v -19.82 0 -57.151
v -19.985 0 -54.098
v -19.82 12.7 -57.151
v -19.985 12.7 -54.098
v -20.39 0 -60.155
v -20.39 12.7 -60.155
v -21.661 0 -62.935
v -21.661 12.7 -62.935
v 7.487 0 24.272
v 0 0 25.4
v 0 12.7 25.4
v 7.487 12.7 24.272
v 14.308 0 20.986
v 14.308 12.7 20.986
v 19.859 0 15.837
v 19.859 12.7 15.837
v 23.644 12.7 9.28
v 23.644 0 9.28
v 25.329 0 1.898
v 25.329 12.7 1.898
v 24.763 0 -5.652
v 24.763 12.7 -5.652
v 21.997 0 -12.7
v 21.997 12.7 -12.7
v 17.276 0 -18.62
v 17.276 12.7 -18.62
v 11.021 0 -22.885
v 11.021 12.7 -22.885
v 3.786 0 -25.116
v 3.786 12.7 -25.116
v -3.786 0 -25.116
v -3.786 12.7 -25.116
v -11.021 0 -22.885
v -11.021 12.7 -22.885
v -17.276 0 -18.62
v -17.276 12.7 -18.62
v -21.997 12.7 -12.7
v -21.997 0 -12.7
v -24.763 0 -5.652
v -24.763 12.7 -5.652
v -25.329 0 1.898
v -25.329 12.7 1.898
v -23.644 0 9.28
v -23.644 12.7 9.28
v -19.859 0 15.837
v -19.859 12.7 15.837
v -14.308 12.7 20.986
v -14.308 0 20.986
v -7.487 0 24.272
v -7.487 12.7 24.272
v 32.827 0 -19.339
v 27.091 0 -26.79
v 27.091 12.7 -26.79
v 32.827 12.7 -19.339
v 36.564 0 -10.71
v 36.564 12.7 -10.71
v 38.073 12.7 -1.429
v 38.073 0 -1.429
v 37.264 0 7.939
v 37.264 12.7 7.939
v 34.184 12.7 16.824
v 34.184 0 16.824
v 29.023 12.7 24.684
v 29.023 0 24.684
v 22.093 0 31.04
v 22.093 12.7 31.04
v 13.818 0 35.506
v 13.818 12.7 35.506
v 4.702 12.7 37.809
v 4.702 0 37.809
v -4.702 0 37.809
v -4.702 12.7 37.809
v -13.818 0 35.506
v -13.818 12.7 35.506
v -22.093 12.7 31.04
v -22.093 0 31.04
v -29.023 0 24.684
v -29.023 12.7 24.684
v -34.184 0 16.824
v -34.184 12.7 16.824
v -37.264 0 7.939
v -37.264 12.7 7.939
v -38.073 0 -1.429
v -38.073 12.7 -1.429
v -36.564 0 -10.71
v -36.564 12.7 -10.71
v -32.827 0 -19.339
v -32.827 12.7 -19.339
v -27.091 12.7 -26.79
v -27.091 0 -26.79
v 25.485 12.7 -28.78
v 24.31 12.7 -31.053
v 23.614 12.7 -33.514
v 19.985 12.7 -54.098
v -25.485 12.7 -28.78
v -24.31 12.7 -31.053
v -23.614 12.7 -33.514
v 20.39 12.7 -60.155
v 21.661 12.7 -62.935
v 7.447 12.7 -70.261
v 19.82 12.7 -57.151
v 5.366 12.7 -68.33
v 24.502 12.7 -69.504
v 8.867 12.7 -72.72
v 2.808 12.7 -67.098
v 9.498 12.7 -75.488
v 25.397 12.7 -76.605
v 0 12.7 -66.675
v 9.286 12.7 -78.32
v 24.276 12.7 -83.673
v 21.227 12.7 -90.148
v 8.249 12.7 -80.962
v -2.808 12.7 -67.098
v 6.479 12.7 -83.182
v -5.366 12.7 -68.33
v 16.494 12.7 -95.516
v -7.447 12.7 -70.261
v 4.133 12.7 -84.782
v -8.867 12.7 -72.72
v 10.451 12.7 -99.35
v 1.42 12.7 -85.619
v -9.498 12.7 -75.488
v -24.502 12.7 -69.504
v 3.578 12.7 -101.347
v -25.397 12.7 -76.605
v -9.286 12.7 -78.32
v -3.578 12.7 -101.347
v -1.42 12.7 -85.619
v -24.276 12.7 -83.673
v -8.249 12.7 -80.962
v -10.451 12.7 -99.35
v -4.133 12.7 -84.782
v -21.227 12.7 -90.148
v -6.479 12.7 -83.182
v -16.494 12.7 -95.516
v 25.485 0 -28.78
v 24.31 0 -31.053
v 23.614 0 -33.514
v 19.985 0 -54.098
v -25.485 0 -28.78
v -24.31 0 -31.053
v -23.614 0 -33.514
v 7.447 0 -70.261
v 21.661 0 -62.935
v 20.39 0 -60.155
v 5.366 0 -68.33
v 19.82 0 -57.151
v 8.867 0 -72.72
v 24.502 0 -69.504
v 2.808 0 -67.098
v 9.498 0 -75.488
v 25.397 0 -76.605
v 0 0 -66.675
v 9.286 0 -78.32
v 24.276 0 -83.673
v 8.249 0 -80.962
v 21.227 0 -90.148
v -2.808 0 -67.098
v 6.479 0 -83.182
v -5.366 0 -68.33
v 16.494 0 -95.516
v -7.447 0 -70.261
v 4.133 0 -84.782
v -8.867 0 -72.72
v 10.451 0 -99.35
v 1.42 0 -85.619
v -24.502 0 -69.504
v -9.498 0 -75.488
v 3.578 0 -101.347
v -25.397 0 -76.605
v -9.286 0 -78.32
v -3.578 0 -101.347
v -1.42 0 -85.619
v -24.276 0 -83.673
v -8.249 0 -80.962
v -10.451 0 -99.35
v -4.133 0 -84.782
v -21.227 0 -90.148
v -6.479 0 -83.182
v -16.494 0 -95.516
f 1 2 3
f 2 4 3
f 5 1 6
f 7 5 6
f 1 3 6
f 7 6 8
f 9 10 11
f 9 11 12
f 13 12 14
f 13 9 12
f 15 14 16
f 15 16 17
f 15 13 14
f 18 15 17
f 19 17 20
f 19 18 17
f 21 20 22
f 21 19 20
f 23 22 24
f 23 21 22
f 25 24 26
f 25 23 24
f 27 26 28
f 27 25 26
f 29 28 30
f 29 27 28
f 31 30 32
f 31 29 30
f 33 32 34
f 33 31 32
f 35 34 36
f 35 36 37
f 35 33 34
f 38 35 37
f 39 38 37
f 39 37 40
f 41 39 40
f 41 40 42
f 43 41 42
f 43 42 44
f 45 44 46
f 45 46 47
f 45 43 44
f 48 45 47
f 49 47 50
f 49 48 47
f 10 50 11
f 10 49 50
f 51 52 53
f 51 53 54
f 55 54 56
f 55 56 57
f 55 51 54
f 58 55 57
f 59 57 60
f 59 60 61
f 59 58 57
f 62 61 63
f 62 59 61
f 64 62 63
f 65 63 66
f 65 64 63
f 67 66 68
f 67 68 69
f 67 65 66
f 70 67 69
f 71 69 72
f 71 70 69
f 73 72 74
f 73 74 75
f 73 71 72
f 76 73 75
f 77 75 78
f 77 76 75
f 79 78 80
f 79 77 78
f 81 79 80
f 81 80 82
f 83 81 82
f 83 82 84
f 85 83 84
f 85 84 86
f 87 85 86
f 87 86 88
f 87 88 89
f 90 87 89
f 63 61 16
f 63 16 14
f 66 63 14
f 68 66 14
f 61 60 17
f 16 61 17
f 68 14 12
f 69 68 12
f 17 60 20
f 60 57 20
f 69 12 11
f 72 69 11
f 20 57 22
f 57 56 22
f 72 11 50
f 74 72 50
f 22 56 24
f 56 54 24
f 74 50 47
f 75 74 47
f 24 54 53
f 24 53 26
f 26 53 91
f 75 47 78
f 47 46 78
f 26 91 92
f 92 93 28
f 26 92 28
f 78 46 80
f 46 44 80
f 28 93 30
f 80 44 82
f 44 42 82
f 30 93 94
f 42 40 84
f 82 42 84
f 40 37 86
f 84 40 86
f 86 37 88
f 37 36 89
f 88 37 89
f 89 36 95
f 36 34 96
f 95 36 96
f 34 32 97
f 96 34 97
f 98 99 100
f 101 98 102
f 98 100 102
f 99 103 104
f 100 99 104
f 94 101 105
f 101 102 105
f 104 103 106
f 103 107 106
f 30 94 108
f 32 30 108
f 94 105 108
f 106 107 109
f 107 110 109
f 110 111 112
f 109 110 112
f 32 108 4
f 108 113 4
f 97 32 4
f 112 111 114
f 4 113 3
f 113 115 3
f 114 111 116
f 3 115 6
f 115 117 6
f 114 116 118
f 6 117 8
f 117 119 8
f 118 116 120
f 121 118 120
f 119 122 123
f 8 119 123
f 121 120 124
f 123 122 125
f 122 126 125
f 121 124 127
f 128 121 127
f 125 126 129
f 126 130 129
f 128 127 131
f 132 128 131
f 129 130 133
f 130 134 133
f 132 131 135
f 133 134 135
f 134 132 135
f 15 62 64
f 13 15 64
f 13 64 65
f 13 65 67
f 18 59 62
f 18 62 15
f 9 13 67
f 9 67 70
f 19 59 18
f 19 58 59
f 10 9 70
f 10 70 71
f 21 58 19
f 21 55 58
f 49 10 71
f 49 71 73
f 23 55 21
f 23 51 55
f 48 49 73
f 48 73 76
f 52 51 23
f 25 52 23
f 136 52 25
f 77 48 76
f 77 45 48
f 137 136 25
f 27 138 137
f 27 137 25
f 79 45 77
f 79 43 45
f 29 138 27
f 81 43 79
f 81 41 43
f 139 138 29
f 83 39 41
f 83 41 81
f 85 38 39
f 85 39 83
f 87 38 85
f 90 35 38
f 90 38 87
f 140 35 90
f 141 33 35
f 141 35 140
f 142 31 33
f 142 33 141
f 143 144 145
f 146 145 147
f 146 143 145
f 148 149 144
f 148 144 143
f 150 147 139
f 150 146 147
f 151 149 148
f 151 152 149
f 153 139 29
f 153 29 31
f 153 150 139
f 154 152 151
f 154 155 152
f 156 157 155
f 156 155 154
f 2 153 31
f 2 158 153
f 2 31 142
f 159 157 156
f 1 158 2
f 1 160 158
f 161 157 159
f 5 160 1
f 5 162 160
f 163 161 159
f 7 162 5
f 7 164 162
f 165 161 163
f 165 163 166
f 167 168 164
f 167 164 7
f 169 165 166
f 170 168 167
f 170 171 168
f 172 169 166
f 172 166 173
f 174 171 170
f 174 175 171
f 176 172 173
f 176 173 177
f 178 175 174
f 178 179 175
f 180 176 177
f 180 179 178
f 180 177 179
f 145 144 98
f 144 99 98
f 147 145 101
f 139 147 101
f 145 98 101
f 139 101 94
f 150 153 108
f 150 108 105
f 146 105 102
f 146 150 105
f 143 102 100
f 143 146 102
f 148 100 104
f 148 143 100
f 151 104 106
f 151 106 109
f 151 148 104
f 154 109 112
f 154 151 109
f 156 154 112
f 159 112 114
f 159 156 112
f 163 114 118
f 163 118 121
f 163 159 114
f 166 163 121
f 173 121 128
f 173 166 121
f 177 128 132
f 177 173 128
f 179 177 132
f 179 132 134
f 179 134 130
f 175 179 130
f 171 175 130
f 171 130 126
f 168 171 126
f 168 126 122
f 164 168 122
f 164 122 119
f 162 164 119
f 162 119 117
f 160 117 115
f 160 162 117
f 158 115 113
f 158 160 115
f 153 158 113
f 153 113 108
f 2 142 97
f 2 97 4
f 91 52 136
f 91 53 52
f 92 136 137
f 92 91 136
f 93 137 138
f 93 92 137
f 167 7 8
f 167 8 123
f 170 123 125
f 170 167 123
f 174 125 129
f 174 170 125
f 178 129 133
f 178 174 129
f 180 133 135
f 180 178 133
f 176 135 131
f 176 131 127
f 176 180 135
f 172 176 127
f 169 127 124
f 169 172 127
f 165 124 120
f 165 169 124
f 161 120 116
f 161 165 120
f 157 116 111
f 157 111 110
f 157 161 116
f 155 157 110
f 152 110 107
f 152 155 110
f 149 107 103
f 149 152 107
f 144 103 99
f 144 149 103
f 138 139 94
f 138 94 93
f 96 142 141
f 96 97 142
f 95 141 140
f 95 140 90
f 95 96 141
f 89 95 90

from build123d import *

# Parameters (mm, degrees)
SKETCH1_R           = 25.4
SKETCH1_R_2         = 9.525
BOSS_EXTRUDE1_DEPTH = 12.7
FILLET1_R           = 12.7


with BuildPart() as part:
    # Sketch1 → Boss-Extrude1 (new body)
    with BuildSketch(Plane(origin=(0, 0, 0), x_dir=(1, 0, 0), z_dir=(0, 1, 0))):
        with BuildLine():
            Line((-24.35791626, 29.296790191), (-19.05, 59.399479175))
            ThreePointArc((-19.05, 59.399479175), (0, 101.6), (19.05, 59.399479175))
            Line((19.05, 59.399479175), (24.35791626, 29.296790191))
            ThreePointArc((24.35791626, 29.296790191), (0, -38.1), (-24.35791626, 29.296790191))
        make_face()
        with Locations(Location((0, 0, 0), (0, 0, 270))):
            Circle(SKETCH1_R, mode=Mode.SUBTRACT)
        with Locations(Location((0, 76.2, 0), (0, 0, 270))):
            Circle(SKETCH1_R_2, mode=Mode.SUBTRACT)
    extrude(amount=BOSS_EXTRUDE1_DEPTH)

    # Fillet1
    fillet1_edges = [part.edges().sort_by_distance(p)[0] for p in [
        (19.05, 6.35, -59.399479175),
        (24.35791626, 6.35, -29.296790191),
        (-24.35791626, 6.35, -29.296790191),
        (-19.05, 6.35, -59.399479175),
    ]]
    fillet(fillet1_edges, radius=FILLET1_R)


solid = part.part
